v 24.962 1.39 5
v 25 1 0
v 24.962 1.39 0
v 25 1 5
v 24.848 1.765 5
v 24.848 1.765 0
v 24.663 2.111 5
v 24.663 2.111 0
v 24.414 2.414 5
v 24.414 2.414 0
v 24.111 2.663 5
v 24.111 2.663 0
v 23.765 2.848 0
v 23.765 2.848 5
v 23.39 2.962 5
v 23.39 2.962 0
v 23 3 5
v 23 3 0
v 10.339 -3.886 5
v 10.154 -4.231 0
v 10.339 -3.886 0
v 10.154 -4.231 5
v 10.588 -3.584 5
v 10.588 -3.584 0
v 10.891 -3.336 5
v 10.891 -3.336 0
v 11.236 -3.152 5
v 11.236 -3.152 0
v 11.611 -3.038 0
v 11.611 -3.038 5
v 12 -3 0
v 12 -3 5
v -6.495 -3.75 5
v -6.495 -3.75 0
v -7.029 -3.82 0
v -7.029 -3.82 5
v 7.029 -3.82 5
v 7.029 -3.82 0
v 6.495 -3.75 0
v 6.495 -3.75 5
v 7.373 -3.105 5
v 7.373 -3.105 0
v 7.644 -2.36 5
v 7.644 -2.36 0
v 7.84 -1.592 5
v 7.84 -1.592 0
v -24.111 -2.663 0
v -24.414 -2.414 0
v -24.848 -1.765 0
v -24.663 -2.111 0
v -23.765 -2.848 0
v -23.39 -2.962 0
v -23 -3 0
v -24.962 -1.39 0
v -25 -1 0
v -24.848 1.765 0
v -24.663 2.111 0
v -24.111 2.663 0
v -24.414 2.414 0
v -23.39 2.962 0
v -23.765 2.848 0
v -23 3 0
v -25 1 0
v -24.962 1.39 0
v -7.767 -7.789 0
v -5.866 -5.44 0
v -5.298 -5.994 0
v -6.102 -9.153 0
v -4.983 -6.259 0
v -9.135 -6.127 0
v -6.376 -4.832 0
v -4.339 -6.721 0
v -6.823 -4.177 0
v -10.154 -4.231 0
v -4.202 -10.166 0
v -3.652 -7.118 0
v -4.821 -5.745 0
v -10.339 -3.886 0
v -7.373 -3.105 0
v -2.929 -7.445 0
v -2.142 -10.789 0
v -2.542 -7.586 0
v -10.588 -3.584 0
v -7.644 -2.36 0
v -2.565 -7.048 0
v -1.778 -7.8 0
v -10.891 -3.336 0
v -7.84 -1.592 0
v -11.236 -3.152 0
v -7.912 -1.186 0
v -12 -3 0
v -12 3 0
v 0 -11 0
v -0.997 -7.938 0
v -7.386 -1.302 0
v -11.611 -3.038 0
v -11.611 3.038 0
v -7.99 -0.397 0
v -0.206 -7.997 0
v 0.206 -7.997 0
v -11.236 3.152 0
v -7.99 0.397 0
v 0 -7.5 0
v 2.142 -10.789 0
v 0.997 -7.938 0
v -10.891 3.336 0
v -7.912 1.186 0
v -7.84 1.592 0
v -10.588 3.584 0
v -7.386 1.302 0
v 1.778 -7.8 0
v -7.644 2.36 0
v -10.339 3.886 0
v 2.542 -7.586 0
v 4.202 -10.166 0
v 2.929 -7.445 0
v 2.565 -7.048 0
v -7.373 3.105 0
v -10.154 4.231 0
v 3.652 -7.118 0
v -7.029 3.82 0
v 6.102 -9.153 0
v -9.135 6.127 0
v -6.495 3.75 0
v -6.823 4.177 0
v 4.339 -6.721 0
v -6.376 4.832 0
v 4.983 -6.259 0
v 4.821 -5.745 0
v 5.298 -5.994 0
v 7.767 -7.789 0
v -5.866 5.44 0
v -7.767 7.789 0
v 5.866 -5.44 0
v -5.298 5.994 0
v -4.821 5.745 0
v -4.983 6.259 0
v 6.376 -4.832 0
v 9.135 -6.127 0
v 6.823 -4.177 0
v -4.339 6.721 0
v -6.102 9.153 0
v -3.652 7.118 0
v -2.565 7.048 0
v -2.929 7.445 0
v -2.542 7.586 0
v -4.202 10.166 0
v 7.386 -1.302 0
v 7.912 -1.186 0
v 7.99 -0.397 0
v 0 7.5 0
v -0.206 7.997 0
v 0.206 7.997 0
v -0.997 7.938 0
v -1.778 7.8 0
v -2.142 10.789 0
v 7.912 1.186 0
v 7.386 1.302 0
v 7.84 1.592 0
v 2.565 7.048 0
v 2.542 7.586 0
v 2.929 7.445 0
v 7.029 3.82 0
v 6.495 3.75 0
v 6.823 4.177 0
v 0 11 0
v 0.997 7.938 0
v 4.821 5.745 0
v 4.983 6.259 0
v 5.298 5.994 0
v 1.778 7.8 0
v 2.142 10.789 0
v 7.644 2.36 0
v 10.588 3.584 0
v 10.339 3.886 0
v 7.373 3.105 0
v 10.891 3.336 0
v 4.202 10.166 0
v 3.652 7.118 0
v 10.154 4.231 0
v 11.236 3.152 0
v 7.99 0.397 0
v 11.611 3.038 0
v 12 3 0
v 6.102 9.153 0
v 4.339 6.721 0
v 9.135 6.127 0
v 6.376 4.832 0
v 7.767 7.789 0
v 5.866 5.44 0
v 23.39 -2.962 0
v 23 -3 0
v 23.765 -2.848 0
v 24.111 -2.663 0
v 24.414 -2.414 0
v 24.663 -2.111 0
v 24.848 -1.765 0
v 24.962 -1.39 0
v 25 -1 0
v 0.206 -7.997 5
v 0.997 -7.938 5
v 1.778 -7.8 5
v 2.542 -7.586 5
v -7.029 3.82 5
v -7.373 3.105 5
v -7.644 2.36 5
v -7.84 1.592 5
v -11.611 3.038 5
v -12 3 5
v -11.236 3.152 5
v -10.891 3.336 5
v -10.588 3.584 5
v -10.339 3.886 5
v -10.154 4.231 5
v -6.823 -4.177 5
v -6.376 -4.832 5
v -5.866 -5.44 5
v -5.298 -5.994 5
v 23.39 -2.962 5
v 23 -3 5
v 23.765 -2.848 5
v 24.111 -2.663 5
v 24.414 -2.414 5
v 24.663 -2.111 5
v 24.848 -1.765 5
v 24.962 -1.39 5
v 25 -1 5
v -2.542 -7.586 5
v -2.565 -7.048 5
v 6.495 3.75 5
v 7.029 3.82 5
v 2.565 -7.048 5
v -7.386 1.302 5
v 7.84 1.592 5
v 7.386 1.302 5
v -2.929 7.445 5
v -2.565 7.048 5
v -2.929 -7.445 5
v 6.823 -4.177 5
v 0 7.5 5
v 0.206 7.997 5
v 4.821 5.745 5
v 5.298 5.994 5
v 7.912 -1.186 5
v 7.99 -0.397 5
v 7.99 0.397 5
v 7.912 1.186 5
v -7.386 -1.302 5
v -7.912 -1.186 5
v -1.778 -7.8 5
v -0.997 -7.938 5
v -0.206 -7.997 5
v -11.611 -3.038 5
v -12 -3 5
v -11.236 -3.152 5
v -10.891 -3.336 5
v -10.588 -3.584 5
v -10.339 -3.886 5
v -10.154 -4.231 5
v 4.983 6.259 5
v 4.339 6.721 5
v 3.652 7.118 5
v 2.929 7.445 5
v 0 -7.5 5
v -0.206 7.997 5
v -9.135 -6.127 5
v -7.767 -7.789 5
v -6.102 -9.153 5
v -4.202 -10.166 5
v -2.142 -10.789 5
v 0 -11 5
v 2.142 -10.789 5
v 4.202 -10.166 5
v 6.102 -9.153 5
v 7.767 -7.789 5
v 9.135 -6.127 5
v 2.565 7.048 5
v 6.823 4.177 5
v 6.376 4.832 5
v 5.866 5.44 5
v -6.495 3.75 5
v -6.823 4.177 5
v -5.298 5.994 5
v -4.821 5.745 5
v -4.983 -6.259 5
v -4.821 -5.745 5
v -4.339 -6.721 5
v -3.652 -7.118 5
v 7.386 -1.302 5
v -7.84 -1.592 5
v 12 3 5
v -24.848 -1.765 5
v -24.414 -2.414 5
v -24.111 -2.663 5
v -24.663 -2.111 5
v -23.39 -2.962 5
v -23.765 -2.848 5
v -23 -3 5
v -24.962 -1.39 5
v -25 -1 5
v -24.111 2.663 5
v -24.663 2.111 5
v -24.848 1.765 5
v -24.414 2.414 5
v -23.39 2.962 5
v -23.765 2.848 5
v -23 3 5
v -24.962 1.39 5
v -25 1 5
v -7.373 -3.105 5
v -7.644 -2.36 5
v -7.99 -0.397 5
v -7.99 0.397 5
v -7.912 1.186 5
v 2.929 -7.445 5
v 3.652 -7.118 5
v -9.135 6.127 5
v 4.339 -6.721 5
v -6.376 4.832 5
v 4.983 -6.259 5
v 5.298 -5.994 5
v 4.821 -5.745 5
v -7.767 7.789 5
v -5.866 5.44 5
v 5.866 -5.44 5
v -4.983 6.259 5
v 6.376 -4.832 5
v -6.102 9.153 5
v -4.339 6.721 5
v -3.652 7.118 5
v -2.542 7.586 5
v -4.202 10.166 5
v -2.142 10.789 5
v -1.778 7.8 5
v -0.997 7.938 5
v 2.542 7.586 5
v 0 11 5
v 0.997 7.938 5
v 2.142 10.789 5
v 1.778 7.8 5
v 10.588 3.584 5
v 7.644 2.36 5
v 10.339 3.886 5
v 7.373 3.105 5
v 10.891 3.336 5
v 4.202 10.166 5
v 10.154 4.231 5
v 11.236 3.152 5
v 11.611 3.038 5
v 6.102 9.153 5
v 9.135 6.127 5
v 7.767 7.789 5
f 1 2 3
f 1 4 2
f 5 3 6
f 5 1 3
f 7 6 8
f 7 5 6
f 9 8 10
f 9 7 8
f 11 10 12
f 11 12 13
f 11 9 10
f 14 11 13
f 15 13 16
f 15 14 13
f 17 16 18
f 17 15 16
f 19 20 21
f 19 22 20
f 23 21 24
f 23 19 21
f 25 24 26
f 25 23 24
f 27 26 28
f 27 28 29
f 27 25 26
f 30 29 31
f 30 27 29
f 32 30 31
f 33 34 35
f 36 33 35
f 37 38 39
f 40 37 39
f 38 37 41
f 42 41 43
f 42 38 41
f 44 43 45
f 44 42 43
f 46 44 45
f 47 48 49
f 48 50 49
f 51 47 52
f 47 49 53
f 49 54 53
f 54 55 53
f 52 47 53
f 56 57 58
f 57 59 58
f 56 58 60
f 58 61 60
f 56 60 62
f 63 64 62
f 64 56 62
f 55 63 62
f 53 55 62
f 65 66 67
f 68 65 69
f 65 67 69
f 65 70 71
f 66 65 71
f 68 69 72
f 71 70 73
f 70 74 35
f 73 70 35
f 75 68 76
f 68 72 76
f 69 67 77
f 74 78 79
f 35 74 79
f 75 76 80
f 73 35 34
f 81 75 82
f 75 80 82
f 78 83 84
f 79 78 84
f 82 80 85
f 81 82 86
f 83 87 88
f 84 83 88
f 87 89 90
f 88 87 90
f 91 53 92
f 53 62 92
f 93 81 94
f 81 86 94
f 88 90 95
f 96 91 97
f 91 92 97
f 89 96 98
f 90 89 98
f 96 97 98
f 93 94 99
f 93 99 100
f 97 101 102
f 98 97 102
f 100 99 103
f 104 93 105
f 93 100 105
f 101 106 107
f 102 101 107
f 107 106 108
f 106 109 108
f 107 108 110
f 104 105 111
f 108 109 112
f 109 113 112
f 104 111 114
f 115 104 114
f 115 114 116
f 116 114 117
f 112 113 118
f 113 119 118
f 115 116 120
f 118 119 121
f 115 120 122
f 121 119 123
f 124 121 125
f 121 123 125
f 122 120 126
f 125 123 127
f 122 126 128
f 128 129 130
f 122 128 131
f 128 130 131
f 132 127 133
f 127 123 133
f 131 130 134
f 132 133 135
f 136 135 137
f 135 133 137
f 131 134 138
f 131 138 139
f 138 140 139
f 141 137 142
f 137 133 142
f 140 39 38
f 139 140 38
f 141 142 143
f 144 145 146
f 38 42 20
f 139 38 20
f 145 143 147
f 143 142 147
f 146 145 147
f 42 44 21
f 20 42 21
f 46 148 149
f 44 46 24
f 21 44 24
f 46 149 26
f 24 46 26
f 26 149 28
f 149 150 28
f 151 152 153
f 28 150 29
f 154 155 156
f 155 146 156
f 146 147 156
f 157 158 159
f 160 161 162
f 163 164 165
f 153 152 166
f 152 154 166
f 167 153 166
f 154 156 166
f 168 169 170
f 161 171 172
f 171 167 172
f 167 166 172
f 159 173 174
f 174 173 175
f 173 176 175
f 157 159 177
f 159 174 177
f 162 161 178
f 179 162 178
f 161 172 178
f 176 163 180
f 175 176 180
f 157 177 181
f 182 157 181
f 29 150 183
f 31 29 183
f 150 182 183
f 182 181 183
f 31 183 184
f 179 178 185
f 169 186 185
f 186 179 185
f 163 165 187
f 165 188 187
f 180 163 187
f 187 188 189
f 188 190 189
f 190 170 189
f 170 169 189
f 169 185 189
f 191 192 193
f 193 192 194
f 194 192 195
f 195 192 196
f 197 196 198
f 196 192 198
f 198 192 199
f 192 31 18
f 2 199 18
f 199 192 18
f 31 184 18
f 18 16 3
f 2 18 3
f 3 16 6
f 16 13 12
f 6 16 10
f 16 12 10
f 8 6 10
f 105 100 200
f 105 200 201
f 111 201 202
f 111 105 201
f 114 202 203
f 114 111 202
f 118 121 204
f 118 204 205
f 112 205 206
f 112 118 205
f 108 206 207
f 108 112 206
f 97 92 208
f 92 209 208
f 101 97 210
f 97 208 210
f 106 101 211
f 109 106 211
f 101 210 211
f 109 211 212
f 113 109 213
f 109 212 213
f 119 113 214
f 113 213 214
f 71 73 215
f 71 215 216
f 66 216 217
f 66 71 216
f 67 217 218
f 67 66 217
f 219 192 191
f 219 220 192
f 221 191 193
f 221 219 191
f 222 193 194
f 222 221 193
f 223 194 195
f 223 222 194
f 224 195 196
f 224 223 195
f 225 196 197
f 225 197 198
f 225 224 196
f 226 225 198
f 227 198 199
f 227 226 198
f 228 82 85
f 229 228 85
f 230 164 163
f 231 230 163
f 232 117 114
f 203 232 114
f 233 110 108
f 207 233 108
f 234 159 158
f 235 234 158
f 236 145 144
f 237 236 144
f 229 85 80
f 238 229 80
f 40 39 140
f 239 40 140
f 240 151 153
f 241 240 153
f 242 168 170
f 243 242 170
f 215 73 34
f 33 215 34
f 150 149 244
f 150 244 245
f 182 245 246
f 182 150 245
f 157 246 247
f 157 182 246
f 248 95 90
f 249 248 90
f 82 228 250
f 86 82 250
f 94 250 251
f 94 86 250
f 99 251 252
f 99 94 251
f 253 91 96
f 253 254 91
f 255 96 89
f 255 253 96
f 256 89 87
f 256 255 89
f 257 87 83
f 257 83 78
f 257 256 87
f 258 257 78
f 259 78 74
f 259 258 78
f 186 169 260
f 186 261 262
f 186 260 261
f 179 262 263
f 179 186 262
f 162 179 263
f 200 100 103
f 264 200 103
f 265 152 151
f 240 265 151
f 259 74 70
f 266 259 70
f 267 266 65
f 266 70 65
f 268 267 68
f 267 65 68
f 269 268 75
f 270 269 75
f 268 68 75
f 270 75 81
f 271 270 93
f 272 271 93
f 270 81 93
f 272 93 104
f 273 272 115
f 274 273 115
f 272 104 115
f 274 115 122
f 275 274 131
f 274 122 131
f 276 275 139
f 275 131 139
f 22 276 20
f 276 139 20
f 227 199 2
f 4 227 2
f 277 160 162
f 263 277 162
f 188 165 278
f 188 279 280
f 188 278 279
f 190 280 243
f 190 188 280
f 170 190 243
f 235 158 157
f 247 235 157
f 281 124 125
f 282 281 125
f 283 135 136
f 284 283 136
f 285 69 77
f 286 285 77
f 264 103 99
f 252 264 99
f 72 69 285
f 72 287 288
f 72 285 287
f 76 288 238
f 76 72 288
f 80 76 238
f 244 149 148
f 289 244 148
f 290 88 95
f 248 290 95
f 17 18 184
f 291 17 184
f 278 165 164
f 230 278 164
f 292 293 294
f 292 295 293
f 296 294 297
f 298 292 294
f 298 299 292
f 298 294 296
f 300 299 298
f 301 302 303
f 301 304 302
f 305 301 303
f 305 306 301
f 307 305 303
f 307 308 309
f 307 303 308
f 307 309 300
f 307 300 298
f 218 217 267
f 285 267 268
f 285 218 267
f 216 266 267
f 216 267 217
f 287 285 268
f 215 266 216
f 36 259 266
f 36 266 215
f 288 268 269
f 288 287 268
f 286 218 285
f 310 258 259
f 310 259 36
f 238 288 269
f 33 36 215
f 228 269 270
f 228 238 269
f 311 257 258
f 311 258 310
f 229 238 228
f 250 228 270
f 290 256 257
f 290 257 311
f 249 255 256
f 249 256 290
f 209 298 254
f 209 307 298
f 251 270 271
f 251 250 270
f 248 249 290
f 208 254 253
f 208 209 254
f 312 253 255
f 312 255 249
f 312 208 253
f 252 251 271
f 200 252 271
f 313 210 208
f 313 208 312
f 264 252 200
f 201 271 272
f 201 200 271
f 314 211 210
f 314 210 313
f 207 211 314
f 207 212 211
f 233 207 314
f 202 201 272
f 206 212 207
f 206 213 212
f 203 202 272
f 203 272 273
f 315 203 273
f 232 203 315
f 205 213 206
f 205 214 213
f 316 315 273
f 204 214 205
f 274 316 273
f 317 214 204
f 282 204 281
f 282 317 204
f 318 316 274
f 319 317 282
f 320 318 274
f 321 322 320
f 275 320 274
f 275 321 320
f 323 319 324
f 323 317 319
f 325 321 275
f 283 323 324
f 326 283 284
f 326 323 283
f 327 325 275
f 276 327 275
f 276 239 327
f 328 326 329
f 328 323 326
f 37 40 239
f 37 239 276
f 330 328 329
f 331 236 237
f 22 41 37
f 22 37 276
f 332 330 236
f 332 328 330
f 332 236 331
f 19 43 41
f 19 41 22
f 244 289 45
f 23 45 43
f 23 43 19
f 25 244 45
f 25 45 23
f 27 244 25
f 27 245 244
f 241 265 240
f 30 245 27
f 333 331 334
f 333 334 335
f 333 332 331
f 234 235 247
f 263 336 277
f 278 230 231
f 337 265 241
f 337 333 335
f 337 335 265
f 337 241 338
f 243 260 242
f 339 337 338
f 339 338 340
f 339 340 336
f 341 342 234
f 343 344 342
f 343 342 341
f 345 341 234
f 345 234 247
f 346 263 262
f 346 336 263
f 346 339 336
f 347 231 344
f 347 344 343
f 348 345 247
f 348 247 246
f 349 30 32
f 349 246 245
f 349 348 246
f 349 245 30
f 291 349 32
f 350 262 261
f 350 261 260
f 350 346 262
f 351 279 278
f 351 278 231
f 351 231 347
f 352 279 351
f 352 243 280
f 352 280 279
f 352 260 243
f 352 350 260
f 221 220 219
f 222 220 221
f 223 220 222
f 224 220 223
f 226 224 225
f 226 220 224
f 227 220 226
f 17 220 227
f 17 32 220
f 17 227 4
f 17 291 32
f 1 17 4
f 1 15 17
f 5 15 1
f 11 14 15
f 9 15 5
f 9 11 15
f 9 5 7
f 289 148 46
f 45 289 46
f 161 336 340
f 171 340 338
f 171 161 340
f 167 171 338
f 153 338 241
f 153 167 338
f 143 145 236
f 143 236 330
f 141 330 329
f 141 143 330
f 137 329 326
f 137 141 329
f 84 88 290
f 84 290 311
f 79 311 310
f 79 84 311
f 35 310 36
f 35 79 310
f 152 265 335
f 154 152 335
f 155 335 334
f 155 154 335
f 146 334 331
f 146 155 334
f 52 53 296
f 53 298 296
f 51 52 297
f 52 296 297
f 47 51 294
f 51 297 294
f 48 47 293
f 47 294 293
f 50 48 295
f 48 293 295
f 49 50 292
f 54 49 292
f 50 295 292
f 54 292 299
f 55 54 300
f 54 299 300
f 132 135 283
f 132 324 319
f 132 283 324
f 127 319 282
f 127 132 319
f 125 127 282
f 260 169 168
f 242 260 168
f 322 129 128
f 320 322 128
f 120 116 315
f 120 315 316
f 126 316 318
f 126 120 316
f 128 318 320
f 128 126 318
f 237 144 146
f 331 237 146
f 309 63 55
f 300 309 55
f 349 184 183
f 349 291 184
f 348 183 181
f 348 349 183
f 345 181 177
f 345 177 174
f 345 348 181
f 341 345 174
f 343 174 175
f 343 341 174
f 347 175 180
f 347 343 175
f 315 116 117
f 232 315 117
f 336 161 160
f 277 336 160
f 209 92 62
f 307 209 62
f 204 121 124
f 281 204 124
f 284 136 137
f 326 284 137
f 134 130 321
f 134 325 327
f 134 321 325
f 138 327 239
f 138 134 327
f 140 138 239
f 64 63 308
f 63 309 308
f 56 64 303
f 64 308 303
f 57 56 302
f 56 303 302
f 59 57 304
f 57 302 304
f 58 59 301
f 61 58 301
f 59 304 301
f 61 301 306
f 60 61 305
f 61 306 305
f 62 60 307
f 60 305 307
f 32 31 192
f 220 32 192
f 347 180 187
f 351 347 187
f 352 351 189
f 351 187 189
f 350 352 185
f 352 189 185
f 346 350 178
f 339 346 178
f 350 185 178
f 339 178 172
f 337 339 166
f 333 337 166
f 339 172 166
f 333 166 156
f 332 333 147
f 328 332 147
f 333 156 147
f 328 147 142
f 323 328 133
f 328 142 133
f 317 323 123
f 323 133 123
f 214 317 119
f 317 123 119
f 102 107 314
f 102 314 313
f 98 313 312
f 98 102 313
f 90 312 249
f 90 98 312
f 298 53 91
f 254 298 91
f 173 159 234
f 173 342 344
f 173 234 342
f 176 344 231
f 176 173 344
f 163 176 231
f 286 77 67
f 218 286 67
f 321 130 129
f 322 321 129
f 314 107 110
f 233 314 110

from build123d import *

# Parameters (mm, degrees)
F0_R            = 8
F1_DEPTH        = 5
F3_DEPTH        = 5
F3_COPIES_COUNT = 18
F4_R            = 2


# Not quite as in the source:
# - a pattern or mirror of a feature is missing from the dataset's text; its kind, count and spacing are read off the source's solid


with BuildPart() as f1:
    # F0 (on Top) → F1 (new body)
    with BuildSketch(Plane.XY):
        with BuildLine():
            Line((-25, -3), (-10.5830052443, -3))
            ThreePointArc((-10.5830052443, -3), (0, -11), (10.5830052443, -3))
            Line((10.5830052443, -3), (25, -3))
            Line((25, -3), (25, 3))
            Line((25, 3), (10.5830052443, 3))
            ThreePointArc((10.5830052443, 3), (0, 11), (-10.5830052443, 3))
            Line((-10.5830052443, 3), (-25, 3))
            Line((-25, 3), (-25, -3))
        make_face()
        Circle(F0_R, mode=Mode.SUBTRACT)
    extrude(amount=F1_DEPTH)

    # F2 (on Top) → F3 (join)
    with BuildSketch(Plane.XY):
        with BuildLine():
            Line((0, -7.5), (-0.2060079166, -7.9973471063))
            ThreePointArc((-0.2060079166, -7.9973471063), (0, -8), (0.2060079166, -7.9973471063))
            Line((0.2060079166, -7.9973471063), (0, -7.5))
        make_face()
    f3 = extrude(amount=F3_DEPTH)

    # F3_copies: F3 ×18 about axis
    f3_copies_axis = Axis((0, 0, 0), (0, 0, 1))
    for i in range(1, F3_COPIES_COUNT):
        add(f3.rotate(f3_copies_axis, i * 360 / F3_COPIES_COUNT))

    # F4
    f4_edges = [f1.edges().sort_by_distance(p)[0] for p in [
        (-25, 3, 2.5),
        (-25, -3, 2.5),
        (25, 3, 2.5),
        (-10.583005, 3, 2.5),
        (25, -3, 2.5),
        (10.583005, -3, 2.5),
        (-10.583005, -3, 2.5),
        (10.583005, 3, 2.5),
    ]]
    fillet(f4_edges, radius=F4_R)


solid = f1.part
